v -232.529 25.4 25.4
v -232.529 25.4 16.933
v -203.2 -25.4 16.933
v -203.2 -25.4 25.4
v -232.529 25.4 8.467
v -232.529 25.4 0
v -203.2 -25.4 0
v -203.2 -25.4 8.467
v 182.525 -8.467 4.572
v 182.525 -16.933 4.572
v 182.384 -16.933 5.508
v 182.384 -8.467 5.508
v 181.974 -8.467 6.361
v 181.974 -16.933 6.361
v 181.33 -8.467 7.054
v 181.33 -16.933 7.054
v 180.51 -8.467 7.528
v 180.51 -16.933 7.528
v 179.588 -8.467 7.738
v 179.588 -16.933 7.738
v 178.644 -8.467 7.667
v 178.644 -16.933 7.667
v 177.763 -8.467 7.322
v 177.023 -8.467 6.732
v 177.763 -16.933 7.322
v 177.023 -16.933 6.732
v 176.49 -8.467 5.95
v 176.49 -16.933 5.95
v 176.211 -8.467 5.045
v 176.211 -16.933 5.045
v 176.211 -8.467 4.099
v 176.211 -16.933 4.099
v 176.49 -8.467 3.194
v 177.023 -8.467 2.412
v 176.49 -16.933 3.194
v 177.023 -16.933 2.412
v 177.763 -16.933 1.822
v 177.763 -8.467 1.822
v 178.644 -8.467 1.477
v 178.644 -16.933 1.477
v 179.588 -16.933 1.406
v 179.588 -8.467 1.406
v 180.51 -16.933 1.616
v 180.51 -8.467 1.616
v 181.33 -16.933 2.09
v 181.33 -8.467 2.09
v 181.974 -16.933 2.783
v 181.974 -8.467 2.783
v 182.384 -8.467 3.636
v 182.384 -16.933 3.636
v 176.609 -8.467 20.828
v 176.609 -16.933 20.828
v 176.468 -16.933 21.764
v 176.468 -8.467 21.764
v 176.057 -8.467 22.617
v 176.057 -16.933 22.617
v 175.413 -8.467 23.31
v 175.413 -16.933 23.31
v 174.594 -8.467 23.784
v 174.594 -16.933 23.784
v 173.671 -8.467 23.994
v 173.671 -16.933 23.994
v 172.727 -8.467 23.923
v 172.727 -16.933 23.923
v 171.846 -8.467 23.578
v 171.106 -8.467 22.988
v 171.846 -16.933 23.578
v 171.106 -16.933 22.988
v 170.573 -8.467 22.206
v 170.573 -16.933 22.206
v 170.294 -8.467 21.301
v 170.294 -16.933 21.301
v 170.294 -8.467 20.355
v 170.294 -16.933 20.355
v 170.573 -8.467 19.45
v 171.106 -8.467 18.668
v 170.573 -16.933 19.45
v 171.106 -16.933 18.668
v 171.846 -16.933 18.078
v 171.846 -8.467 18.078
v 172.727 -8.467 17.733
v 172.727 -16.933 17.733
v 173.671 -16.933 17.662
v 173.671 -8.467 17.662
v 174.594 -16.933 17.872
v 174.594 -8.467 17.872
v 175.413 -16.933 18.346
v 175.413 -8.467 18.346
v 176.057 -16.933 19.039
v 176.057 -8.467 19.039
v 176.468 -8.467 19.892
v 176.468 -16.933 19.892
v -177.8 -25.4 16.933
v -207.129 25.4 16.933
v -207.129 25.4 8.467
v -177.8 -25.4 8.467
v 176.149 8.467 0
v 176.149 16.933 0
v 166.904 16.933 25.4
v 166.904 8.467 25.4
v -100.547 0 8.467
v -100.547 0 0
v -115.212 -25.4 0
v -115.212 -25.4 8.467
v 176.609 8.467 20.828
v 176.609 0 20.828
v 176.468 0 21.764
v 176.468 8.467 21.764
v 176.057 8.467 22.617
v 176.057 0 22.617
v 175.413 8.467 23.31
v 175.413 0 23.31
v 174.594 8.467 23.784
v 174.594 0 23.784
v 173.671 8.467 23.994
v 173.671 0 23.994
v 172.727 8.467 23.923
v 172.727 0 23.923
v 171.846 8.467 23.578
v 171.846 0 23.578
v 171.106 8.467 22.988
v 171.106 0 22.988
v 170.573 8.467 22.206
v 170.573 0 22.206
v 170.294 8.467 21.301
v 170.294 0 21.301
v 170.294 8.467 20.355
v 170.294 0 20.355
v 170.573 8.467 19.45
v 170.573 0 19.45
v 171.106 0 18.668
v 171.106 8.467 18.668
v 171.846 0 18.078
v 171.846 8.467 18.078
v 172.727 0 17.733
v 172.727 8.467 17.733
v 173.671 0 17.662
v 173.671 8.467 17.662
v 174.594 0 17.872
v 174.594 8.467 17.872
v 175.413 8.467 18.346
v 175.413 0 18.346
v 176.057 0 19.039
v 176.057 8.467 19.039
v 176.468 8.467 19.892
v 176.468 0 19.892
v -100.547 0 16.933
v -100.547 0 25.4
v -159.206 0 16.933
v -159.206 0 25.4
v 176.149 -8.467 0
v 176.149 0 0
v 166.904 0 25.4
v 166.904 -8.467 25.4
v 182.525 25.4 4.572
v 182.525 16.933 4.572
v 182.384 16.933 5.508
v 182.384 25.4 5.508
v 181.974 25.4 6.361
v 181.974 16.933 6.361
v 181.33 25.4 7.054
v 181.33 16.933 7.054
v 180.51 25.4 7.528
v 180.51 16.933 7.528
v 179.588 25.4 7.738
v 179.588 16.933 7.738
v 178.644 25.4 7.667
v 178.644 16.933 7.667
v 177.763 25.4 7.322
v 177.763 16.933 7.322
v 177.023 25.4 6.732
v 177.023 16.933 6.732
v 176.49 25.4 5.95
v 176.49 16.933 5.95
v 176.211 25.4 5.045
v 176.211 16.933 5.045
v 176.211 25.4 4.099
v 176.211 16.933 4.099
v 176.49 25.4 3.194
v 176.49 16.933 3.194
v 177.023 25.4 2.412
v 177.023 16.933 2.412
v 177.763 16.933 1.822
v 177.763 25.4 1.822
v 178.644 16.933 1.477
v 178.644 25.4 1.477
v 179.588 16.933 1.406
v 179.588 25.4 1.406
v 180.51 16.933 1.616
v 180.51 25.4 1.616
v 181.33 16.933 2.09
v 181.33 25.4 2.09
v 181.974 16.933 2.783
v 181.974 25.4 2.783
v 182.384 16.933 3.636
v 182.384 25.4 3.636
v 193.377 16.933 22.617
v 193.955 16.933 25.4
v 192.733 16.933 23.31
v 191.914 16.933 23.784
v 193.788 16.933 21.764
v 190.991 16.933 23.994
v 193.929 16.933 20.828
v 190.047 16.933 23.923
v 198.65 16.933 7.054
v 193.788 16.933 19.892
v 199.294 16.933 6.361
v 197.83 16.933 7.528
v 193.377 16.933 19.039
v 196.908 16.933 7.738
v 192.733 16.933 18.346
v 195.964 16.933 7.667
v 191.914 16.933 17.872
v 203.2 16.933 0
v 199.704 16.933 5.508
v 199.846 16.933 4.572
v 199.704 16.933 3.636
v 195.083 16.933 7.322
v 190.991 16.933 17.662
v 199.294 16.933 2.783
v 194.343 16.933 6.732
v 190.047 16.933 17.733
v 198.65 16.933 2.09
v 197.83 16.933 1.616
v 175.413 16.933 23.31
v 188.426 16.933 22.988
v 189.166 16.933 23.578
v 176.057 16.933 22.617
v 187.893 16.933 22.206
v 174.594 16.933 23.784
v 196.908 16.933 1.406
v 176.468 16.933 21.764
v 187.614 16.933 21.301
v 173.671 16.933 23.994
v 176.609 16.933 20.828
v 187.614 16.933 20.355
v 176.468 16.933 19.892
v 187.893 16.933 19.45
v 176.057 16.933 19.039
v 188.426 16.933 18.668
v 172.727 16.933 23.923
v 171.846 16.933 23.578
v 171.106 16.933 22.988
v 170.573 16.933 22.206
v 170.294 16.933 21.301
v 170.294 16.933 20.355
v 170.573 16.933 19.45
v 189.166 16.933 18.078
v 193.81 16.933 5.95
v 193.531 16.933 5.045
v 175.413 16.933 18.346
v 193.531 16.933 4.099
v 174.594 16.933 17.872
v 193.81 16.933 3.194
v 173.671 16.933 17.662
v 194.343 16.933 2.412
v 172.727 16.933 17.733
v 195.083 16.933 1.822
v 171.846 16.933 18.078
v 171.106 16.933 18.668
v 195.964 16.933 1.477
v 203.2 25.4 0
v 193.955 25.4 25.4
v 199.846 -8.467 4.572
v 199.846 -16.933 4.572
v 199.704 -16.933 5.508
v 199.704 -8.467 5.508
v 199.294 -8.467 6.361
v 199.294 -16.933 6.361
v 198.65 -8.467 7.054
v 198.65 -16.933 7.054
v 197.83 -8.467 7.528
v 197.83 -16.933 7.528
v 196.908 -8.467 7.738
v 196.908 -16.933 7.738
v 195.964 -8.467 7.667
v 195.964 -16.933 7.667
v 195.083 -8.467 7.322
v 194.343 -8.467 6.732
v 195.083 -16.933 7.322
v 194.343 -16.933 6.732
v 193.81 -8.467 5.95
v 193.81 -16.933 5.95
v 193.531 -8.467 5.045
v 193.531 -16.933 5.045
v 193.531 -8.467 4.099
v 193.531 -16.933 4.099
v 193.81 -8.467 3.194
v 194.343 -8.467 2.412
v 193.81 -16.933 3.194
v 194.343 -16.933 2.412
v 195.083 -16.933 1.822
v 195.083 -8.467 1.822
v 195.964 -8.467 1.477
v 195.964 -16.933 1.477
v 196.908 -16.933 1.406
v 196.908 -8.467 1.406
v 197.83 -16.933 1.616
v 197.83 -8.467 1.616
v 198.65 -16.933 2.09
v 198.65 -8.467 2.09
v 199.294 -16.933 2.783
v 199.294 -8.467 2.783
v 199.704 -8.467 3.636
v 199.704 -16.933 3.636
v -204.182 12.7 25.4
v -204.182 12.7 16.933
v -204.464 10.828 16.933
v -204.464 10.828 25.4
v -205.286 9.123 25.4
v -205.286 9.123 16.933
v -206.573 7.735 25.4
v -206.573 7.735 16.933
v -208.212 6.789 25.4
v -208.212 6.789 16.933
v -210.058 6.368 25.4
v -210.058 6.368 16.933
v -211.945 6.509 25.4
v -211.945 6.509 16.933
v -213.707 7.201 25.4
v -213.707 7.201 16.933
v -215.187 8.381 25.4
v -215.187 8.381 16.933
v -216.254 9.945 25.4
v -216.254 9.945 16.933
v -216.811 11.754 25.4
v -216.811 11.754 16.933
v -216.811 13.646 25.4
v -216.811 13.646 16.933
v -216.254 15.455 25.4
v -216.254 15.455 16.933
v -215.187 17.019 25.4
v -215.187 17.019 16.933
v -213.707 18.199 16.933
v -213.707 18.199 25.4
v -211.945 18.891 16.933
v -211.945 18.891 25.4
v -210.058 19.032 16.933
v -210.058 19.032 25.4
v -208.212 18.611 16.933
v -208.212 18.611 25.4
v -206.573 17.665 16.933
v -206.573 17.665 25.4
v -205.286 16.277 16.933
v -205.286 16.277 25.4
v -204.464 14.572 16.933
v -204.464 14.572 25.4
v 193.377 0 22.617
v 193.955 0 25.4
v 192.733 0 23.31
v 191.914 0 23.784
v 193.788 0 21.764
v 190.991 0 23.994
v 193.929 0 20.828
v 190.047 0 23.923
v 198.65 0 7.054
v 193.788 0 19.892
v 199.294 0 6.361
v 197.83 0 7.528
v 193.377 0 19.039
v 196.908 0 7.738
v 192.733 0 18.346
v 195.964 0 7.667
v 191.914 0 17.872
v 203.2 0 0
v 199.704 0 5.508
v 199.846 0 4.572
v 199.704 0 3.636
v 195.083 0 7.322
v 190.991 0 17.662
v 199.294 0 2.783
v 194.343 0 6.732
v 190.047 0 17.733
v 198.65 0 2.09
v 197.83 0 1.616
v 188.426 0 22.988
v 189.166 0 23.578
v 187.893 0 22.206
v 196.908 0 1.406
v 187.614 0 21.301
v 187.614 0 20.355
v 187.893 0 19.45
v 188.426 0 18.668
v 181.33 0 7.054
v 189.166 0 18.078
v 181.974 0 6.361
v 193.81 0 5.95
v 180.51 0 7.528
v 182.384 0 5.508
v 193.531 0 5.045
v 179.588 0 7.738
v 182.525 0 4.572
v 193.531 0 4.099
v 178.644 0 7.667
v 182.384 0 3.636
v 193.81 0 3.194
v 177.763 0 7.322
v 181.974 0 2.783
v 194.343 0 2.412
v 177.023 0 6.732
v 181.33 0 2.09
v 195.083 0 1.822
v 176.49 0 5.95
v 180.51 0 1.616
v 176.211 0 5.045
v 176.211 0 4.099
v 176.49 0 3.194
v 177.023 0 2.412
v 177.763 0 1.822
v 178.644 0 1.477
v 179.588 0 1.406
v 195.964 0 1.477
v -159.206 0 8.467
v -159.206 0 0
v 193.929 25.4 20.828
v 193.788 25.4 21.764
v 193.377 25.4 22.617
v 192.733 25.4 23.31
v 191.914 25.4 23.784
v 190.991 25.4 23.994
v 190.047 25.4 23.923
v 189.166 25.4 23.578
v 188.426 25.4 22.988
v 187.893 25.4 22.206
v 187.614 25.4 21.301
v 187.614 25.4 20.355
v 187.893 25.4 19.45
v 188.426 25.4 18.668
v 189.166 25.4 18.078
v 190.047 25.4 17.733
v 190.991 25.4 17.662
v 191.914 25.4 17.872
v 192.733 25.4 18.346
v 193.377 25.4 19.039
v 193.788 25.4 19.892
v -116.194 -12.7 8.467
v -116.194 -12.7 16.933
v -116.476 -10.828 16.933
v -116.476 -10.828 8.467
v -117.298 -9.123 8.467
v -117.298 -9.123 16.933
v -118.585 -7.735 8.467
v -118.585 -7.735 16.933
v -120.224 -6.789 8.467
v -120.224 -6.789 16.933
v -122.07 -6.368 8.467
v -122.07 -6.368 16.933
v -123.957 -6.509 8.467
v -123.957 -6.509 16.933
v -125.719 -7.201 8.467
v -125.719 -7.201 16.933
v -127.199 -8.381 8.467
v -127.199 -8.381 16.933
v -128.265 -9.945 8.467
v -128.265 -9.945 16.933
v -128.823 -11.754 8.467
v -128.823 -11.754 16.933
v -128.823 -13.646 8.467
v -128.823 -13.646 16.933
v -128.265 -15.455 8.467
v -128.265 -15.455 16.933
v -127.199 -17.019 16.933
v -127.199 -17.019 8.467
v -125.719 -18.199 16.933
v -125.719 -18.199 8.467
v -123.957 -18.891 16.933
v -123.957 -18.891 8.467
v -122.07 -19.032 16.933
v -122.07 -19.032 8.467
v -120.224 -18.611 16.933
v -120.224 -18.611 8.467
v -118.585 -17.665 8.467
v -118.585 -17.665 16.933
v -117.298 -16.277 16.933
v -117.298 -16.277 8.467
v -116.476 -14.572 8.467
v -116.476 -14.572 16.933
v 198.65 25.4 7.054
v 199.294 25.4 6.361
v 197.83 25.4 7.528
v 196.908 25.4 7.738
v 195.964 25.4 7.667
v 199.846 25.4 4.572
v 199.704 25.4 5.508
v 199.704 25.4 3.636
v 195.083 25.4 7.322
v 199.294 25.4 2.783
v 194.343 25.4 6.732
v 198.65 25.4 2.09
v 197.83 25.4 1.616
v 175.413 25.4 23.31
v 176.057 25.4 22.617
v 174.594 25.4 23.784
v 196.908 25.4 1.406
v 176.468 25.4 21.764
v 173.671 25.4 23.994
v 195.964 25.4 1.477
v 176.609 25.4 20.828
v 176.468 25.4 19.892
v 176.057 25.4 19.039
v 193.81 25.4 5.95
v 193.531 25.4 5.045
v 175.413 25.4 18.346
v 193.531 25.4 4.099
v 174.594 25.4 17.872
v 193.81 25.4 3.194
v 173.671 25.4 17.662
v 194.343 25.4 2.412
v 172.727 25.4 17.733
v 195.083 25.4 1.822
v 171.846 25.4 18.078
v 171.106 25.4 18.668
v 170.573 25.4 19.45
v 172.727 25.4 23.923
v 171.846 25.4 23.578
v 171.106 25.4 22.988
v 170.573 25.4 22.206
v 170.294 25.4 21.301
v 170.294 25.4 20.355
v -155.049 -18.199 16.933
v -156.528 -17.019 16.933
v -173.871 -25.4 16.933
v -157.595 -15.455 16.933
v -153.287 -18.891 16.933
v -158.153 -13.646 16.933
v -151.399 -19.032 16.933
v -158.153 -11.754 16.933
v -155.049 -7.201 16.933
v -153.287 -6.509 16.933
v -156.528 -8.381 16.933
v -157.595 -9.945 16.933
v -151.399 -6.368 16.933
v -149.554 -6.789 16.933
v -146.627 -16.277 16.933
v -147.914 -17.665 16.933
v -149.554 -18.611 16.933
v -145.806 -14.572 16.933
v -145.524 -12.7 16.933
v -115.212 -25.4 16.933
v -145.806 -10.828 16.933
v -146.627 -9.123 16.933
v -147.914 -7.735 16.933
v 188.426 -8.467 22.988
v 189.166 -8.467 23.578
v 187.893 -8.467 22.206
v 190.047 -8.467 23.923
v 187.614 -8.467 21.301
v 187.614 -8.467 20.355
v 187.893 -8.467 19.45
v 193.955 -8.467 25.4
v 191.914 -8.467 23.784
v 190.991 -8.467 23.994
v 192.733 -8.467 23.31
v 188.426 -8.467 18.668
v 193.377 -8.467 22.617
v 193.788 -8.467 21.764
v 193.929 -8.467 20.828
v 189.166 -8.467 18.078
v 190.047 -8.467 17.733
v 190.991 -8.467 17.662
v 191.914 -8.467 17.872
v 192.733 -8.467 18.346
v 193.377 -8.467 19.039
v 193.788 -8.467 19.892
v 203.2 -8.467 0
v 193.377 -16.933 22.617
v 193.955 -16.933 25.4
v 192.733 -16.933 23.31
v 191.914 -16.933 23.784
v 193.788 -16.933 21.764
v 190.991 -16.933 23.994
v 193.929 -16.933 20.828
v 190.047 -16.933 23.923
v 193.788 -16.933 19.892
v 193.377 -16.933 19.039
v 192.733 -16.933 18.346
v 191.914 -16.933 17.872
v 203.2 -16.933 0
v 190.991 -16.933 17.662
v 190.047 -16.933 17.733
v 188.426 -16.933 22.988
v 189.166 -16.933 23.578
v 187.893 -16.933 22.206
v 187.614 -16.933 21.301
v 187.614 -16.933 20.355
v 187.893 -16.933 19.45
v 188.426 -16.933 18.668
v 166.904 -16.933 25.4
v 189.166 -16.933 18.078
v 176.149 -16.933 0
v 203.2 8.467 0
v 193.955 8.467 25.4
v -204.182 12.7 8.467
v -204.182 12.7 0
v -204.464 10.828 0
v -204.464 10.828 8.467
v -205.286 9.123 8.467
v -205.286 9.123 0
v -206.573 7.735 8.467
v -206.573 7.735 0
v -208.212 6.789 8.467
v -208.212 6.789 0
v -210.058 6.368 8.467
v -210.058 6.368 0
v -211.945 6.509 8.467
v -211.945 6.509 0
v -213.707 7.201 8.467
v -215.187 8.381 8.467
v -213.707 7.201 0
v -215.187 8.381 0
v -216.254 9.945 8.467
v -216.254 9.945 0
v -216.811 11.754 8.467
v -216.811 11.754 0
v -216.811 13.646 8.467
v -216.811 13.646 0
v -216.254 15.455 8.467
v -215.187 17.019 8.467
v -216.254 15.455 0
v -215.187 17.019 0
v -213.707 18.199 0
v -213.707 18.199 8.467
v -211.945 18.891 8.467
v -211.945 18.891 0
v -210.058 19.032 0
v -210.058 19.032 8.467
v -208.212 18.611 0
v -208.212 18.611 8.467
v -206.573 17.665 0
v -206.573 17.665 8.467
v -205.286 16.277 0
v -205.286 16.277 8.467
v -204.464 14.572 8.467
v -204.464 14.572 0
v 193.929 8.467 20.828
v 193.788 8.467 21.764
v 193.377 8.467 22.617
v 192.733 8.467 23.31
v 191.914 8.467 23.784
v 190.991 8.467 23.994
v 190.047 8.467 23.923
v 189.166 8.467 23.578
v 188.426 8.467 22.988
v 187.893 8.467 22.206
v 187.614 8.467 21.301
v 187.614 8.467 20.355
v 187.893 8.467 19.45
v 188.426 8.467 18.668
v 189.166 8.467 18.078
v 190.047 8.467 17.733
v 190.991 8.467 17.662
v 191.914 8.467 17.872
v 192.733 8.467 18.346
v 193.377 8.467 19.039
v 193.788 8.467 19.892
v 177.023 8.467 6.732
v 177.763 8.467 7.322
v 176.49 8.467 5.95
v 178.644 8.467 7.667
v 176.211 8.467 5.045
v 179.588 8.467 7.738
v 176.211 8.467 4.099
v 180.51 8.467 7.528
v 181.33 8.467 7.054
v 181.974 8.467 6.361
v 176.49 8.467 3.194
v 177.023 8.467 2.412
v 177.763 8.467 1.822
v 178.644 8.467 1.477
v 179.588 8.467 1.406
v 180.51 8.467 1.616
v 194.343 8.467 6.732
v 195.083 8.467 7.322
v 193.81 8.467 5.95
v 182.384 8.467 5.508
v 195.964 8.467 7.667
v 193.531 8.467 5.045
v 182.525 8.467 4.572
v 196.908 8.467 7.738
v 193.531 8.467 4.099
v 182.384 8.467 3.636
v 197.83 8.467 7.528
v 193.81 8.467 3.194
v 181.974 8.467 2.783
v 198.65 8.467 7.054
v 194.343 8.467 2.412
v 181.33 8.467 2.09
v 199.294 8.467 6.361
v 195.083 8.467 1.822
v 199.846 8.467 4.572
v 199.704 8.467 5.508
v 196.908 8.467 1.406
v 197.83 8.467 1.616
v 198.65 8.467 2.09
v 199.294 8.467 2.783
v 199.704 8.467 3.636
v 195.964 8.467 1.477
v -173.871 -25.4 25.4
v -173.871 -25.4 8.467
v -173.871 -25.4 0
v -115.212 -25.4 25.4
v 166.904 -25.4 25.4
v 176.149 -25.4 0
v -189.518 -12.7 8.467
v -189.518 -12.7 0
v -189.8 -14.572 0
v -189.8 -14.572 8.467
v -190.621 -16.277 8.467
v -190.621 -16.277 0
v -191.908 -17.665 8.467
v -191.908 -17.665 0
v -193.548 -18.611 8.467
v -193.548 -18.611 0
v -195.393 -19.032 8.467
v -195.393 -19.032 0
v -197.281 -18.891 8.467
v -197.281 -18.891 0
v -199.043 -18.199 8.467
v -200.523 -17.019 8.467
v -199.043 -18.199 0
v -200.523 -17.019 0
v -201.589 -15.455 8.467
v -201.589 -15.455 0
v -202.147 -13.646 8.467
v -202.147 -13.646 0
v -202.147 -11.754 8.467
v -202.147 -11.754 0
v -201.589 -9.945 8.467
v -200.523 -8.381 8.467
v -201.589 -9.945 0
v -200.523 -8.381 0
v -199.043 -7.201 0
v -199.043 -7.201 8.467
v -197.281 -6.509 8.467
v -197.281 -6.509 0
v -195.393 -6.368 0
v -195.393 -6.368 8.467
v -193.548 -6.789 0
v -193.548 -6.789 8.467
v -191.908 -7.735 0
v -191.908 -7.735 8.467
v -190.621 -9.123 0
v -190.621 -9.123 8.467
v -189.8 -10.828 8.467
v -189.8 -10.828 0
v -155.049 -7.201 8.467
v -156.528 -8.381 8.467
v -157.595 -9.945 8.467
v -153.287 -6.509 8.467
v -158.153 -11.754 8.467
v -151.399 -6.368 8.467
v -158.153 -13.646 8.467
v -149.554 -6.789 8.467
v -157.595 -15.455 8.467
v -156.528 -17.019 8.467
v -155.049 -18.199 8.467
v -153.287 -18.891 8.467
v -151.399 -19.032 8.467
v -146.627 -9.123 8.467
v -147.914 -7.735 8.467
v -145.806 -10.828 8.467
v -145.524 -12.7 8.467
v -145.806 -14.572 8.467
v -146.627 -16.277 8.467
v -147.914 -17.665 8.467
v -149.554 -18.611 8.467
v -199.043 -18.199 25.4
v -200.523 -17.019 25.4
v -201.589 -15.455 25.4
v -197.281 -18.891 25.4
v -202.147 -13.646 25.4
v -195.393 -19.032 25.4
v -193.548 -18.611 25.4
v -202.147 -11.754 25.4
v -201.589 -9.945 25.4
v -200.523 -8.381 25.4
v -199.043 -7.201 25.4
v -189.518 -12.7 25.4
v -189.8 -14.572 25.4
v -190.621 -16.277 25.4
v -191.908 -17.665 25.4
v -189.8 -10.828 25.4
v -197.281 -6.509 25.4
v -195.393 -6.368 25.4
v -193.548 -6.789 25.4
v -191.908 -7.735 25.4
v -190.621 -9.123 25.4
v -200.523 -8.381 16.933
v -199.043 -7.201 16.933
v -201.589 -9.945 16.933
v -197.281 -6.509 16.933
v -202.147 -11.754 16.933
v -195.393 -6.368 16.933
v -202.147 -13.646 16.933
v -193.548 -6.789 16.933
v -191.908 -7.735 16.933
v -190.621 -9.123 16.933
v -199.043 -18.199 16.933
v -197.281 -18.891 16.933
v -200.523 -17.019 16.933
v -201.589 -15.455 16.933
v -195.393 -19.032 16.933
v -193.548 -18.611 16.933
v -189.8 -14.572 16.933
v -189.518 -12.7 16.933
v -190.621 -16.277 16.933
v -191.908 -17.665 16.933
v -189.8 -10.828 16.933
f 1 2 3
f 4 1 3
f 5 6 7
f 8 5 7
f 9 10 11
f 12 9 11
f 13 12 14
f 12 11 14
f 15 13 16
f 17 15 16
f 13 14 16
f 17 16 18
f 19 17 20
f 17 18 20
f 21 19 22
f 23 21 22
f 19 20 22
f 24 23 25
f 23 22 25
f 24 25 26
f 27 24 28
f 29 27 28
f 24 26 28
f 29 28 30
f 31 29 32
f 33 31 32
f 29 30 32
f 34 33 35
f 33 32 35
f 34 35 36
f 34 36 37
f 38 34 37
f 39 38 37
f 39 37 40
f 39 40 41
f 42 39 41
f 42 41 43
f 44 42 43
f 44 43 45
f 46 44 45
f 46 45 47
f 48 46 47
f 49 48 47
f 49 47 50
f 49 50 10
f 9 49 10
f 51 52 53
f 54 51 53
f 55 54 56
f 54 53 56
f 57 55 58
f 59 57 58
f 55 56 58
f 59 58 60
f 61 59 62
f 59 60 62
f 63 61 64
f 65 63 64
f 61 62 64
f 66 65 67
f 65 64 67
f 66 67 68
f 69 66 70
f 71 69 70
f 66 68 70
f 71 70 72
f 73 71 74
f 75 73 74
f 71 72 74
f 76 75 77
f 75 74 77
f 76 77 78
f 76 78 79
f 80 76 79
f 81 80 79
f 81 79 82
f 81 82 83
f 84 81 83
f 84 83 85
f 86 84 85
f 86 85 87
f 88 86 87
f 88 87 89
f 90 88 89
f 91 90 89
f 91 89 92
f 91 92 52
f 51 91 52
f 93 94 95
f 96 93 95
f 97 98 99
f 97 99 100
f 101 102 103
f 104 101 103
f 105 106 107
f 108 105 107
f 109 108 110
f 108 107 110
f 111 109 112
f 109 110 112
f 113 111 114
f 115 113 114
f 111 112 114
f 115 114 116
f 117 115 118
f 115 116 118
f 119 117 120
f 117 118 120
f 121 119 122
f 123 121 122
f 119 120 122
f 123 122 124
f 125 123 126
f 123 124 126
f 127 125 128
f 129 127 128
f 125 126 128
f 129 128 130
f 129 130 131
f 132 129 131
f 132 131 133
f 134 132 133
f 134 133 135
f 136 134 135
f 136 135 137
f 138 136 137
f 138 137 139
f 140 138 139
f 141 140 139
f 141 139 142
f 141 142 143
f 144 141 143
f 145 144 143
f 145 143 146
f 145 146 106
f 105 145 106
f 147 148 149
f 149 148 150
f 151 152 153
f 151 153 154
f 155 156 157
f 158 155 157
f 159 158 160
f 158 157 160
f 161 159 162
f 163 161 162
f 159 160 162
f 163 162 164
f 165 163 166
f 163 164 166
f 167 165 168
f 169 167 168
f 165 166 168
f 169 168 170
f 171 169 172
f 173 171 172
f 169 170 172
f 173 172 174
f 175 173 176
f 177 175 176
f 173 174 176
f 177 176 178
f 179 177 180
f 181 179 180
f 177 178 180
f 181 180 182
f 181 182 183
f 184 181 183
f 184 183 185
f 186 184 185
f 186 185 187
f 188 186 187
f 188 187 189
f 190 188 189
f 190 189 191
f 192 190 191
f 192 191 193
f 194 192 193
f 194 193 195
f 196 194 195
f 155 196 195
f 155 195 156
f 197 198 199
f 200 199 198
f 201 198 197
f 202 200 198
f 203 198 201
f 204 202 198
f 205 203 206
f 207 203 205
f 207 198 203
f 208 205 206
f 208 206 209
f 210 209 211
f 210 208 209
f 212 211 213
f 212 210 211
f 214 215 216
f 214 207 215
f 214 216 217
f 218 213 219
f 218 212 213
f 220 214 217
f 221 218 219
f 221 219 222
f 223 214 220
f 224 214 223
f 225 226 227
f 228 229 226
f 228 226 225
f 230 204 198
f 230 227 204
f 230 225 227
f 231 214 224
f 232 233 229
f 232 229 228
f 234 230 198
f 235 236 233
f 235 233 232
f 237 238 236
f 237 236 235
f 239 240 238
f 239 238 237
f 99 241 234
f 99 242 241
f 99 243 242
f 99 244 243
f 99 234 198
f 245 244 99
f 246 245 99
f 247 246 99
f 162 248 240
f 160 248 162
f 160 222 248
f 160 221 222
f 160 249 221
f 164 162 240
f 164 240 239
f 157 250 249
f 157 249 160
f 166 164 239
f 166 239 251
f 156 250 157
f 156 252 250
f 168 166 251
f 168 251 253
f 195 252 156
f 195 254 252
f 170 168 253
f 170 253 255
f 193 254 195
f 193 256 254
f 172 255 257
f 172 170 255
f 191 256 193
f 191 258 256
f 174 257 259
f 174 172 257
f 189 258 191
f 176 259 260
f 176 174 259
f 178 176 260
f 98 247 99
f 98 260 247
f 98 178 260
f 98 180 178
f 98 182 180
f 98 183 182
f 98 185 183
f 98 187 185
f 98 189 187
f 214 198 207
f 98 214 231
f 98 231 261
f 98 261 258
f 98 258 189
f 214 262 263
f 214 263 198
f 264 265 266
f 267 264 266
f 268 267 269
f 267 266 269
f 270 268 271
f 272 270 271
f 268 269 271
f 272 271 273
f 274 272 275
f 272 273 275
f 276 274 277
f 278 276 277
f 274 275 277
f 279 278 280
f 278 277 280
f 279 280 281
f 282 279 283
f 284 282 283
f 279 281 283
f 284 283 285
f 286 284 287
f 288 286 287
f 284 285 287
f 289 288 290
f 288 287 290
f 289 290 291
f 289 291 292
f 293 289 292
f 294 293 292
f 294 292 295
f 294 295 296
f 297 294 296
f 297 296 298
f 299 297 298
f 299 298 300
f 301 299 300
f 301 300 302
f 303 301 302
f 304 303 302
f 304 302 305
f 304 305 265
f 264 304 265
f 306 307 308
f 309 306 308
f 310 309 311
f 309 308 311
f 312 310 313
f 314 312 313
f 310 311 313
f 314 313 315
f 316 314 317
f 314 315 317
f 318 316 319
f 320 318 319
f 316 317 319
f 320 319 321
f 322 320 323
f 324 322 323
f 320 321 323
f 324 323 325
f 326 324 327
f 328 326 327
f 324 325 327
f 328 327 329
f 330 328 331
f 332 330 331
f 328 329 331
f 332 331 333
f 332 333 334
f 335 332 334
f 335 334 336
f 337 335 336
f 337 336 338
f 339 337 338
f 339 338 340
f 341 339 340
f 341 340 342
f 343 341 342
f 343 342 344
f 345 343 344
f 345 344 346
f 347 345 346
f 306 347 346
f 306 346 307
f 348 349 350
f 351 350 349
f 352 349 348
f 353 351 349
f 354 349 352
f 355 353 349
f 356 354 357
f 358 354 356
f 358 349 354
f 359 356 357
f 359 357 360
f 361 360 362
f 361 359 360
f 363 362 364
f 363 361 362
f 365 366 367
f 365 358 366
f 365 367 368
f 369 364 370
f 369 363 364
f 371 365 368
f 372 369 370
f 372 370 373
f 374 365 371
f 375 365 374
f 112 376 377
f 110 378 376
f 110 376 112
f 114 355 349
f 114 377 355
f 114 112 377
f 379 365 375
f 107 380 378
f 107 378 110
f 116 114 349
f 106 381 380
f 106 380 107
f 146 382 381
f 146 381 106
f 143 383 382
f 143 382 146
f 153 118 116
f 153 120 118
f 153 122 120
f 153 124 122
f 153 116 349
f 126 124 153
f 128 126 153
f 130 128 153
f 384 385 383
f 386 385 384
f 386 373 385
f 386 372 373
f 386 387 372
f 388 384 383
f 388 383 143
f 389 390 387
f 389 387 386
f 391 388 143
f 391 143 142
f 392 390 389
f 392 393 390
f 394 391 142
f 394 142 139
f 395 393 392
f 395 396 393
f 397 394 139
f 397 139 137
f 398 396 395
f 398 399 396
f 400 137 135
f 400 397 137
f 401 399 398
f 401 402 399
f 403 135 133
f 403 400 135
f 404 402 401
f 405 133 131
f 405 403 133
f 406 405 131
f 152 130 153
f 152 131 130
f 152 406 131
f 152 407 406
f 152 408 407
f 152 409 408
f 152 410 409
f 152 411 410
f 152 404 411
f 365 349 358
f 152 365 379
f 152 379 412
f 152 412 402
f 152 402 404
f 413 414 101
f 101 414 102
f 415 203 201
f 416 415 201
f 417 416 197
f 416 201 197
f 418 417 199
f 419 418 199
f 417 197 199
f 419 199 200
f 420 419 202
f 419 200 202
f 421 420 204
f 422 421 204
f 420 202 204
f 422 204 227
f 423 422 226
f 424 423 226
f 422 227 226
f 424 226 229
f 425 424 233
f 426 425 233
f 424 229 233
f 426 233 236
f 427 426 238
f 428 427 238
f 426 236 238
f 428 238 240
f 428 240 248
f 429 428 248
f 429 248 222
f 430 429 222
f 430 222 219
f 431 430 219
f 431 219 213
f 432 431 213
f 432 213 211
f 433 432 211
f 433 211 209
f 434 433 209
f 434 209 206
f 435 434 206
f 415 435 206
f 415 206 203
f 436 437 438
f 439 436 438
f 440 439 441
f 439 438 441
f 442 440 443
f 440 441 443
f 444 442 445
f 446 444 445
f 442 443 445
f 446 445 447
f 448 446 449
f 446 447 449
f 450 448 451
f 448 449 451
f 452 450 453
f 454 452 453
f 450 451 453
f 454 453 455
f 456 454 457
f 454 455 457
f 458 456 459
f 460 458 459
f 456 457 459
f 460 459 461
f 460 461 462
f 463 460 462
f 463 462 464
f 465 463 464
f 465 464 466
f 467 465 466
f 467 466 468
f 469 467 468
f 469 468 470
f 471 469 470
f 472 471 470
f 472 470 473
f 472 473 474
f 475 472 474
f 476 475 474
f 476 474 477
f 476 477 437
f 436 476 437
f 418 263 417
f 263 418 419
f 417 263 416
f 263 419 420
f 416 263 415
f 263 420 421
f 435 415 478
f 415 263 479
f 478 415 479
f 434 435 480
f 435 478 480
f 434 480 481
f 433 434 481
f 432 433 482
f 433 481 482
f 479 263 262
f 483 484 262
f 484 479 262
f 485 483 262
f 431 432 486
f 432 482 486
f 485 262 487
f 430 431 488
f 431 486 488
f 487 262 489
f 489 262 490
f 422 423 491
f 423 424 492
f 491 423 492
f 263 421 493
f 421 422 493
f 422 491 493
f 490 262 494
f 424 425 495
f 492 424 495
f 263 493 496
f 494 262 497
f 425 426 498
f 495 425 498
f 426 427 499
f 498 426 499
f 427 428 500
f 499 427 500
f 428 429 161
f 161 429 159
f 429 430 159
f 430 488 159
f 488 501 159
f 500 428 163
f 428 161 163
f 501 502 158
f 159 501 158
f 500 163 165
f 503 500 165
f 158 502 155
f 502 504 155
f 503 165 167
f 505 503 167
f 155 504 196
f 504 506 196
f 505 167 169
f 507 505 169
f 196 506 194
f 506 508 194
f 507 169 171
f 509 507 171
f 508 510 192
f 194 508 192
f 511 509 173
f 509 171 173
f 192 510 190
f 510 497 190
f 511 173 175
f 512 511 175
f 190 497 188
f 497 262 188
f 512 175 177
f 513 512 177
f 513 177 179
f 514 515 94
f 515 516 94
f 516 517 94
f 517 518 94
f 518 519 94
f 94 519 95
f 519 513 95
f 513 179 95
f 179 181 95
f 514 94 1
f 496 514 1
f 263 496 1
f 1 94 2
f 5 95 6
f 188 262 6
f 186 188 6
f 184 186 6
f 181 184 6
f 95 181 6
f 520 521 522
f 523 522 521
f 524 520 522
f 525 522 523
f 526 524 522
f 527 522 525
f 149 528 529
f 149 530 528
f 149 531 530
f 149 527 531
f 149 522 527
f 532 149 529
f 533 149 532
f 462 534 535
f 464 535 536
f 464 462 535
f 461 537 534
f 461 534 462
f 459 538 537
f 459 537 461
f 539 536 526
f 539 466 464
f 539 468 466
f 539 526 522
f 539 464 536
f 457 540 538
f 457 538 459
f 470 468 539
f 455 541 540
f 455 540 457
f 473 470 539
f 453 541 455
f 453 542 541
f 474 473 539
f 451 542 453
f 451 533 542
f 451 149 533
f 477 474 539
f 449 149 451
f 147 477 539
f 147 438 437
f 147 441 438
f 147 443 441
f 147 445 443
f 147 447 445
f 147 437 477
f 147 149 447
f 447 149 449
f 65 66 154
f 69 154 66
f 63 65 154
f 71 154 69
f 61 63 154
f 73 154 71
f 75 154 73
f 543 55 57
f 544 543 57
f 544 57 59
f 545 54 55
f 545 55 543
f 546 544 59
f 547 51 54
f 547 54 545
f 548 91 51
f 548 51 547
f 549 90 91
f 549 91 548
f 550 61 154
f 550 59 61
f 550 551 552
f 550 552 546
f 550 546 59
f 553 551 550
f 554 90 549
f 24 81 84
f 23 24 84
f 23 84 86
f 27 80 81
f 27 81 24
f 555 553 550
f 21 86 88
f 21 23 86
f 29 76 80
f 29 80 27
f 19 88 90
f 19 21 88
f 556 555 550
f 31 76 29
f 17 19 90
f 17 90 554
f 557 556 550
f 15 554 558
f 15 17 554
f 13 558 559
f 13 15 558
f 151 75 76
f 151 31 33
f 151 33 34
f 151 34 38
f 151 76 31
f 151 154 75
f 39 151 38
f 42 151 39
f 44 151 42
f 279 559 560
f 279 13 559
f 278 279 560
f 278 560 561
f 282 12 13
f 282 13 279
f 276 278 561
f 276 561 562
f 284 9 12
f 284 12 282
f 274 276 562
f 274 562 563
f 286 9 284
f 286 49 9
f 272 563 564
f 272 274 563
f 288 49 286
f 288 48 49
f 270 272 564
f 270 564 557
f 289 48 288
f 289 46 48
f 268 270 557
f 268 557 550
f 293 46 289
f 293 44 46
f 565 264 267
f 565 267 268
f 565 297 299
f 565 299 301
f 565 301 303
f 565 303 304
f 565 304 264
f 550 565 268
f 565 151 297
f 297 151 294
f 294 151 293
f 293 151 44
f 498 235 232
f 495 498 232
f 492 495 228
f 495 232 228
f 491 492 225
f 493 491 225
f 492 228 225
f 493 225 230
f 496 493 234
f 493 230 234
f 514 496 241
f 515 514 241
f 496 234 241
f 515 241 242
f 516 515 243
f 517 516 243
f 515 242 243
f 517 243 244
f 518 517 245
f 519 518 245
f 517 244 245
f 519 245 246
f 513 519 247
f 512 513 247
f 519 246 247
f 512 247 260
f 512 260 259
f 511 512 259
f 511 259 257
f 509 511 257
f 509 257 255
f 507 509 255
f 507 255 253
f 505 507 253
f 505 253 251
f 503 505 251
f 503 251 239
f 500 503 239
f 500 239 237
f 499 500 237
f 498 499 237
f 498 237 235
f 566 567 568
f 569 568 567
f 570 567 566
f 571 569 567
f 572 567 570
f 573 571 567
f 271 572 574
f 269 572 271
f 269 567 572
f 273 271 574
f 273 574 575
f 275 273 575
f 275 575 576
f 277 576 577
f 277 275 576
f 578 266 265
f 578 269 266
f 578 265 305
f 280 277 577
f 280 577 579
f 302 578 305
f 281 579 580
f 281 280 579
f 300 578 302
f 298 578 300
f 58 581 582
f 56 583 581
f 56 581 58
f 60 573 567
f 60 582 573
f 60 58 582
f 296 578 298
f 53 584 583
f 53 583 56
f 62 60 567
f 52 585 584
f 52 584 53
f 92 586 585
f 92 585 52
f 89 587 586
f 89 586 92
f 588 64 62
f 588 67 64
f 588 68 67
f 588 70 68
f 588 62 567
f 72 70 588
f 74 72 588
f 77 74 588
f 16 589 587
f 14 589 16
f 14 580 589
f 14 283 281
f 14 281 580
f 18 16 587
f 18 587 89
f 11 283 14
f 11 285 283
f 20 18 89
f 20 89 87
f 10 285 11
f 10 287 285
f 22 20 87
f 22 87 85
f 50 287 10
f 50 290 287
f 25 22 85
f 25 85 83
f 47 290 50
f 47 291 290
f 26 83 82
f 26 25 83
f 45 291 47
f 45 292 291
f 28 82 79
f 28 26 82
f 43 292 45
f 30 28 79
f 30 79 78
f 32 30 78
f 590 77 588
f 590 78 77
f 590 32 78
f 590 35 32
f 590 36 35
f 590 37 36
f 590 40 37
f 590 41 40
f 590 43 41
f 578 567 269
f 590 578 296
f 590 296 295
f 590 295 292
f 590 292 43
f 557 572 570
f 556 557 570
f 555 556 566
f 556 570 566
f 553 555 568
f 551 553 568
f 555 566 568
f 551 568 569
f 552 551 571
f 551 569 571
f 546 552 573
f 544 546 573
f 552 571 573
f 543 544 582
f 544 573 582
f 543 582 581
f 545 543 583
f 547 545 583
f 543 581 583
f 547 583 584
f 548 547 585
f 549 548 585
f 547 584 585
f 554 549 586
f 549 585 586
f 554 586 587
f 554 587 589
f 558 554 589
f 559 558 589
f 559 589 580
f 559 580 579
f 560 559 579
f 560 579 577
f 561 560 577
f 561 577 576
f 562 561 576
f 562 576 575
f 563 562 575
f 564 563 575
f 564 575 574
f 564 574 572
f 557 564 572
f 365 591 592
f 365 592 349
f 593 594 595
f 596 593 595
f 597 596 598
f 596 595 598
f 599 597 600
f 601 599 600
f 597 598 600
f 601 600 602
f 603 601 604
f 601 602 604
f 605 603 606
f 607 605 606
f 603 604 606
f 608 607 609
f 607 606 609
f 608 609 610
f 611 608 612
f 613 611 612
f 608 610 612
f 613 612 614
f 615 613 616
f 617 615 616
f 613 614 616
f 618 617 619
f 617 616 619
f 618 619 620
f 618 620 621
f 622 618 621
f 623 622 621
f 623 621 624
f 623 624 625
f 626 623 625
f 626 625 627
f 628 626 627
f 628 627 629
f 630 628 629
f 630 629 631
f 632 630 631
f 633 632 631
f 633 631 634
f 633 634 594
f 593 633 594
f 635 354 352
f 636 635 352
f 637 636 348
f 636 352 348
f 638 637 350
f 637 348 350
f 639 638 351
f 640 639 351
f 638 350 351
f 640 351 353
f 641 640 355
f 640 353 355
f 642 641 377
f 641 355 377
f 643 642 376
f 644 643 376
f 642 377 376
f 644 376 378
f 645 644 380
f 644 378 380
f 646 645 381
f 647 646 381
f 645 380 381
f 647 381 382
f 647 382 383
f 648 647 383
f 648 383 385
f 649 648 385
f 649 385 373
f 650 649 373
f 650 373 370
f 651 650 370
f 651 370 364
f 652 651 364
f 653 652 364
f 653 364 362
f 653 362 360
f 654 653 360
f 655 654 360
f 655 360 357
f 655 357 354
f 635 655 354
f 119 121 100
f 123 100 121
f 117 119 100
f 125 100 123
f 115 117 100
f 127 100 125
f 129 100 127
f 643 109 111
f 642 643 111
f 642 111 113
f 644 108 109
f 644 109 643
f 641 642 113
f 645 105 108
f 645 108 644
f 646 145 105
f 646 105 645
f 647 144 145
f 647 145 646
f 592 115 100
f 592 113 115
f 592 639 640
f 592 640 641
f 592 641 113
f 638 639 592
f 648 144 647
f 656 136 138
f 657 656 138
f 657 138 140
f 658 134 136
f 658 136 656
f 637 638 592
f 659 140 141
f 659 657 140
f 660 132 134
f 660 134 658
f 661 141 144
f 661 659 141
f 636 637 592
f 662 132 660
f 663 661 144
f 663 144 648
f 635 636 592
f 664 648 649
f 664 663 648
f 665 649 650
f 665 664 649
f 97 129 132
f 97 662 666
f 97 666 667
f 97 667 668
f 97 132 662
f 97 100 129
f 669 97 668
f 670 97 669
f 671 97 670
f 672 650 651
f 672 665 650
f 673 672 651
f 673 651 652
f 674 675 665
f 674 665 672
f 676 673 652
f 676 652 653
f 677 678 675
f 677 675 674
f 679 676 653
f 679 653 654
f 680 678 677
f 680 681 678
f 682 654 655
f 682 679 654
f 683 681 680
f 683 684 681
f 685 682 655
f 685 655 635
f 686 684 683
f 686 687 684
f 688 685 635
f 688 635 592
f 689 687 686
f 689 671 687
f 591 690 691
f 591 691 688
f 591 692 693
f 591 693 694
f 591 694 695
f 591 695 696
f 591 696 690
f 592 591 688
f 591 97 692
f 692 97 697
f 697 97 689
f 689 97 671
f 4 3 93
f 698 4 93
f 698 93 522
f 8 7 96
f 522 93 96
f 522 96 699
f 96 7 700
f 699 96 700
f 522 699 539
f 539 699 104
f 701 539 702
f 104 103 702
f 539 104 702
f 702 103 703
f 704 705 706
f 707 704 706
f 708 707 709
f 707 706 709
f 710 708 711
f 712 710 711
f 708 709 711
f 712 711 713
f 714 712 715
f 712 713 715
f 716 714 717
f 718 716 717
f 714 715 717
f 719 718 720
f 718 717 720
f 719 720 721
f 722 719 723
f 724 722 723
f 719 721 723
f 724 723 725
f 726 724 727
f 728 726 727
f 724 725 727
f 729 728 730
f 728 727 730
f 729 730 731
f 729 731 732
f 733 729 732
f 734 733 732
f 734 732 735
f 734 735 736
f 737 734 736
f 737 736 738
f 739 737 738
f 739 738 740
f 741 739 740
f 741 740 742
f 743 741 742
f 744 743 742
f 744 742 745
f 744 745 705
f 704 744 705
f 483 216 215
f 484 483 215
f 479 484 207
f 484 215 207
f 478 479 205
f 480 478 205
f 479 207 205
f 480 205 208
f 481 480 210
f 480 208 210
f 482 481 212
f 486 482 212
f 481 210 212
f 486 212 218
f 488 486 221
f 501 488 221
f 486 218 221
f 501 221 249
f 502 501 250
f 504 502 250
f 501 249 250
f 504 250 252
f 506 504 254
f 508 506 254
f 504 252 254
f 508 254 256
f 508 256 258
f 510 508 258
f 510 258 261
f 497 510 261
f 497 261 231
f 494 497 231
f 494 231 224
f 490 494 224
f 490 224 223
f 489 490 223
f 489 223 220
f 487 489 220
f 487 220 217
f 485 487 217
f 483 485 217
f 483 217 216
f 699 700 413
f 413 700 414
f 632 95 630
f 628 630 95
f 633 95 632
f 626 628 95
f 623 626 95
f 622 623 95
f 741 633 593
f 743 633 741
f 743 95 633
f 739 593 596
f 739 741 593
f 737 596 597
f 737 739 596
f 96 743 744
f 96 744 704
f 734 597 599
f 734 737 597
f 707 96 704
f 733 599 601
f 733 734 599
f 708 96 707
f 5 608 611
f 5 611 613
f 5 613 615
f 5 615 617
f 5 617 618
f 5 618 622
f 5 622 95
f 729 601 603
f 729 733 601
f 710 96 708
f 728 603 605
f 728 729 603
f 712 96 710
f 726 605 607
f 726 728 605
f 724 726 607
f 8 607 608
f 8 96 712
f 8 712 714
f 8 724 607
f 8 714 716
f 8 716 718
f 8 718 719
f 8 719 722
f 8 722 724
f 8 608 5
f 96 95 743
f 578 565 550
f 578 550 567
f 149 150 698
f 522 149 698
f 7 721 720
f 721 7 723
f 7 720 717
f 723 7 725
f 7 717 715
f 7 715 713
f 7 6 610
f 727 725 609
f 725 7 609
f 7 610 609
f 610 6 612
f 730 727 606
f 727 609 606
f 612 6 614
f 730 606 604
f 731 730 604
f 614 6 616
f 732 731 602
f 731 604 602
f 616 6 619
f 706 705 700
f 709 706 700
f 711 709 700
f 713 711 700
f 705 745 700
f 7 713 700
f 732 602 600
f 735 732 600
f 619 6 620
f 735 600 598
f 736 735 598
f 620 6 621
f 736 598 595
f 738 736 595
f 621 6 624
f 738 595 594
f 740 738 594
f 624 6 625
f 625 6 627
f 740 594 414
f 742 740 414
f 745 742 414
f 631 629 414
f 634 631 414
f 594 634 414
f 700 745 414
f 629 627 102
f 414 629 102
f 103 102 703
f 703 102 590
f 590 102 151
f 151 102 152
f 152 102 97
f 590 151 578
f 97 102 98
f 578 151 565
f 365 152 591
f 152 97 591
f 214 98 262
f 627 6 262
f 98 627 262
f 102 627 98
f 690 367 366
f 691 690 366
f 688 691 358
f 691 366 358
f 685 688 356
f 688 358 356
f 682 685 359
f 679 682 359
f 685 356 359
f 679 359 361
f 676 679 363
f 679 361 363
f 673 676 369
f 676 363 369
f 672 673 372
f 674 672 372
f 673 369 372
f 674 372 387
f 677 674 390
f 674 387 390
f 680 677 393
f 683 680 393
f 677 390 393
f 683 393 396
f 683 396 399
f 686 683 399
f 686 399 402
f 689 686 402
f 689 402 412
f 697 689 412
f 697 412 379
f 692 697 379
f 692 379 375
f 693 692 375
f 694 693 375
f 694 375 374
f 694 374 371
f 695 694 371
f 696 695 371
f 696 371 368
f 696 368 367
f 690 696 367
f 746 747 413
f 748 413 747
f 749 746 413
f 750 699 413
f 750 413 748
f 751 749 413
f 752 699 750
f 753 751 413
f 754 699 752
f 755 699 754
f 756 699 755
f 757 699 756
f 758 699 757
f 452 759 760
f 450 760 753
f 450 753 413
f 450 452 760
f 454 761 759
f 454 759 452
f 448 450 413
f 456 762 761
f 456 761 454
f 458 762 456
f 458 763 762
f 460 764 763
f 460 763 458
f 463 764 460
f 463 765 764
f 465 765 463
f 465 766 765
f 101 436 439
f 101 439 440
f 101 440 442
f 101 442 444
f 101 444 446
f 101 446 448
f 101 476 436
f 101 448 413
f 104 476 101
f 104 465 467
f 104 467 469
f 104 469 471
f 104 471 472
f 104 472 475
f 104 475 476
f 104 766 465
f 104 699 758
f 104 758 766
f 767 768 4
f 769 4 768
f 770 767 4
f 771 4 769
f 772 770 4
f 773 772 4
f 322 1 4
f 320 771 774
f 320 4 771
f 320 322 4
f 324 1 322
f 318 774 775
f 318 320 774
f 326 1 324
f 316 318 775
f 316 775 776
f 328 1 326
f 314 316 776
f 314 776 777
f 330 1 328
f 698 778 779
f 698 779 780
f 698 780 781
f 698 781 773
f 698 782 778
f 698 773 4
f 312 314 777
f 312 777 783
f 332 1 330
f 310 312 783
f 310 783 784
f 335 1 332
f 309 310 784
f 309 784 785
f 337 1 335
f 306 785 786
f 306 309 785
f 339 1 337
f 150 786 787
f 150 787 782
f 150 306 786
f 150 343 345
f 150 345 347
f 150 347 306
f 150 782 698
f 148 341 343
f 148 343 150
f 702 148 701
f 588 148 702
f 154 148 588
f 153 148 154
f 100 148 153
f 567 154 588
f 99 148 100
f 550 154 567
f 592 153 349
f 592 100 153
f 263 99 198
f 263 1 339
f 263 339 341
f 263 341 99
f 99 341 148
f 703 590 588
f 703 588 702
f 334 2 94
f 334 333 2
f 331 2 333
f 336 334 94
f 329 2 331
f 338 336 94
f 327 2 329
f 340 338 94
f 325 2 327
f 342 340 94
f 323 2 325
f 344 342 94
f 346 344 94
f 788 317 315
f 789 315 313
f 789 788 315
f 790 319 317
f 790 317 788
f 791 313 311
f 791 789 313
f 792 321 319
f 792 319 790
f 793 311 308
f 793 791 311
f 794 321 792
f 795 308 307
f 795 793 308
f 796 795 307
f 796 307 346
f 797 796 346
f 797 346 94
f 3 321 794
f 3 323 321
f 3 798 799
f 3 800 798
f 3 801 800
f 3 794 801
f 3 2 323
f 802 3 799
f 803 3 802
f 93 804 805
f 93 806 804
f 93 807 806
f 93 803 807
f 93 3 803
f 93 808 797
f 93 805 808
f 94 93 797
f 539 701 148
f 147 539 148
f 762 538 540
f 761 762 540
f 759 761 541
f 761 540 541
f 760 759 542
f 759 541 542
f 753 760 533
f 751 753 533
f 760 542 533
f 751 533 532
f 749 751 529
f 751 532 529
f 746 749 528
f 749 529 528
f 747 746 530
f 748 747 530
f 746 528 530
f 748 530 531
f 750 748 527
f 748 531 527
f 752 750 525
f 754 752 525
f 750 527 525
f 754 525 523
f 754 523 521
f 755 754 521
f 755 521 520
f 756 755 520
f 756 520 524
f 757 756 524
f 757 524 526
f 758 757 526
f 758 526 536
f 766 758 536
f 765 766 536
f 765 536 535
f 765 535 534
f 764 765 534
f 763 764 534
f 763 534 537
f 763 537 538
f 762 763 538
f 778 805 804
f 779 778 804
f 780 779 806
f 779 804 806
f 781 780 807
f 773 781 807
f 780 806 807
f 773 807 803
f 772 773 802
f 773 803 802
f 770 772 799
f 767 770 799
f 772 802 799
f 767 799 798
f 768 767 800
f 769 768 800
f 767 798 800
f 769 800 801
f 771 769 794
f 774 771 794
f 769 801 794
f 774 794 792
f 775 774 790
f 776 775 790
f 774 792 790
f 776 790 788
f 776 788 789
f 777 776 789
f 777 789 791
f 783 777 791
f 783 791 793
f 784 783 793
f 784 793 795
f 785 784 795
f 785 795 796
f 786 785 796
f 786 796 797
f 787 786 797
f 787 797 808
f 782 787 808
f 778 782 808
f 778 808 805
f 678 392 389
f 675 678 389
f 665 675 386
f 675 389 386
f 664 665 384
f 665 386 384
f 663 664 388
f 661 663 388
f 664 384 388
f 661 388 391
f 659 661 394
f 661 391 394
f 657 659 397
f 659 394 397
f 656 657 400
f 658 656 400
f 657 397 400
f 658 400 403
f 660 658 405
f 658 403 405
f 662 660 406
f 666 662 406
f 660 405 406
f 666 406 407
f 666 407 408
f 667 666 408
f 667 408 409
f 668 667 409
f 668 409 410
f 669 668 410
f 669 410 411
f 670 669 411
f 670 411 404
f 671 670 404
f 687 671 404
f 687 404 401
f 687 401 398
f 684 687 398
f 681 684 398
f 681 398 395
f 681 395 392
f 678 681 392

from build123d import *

# Parameters (mm, degrees)
F1_DEPTH  = 25.4
F3_DEPTH  = 8.4666666667
F5_DEPTH  = 8.4666666667
F6_W      = 25.4
F6_H      = 8.4666666667
F9_W      = 27.051
F9_H      = 8.4666666667
F13_R     = 6.35
F14_DEPTH = 16.9343333333
F12_R     = 3.175
F15_DEPTH = 42.3343333333
F16_R     = 6.35
F17_DEPTH = 25.401


with BuildPart() as f1:
    # F0 (on Top) → F1 (new body)
    with BuildSketch(Plane.XY):
        Polygon((-232.5293936748, 25.4), (-203.2, -25.4), (203.2, -25.4), (203.2, 25.4), align=None)
    extrude(amount=F1_DEPTH)

    # F2 (on face) → F3 (cut)
    with BuildSketch(Plane.XY.offset(25.4)):
        Polygon((-159.2059094878, 0), (-173.8706063252, -25.4), (-115.2118189755, -25.4), (-100.5471221381, 0), align=None)
    extrude(amount=-F3_DEPTH, mode=Mode.SUBTRACT)

    # F4 (on face) → F5 (cut)
    with BuildSketch(Plane(origin=(0, 0, 0), x_dir=(1, 0, 0), z_dir=(0, 0, -1))):
        Polygon((-100.5471221381, 0), (-115.2118189755, 25.4), (-173.8706063252, 25.4), (-159.2059094878, 0), align=None)
    extrude(amount=-F5_DEPTH, mode=Mode.SUBTRACT)

    # F7: sweep along a path in F7_path
    with BuildLine(Plane(origin=(-232.5293936748, 25.4, 25.4), x_dir=(-0.5, 0.8660254038, 0), z_dir=(-0.8660254038, -0.5, 0))) as f7_path:
        Line((0, 0), (-58.6587873497, 0))
    # F6 (on face) → F7 (sweep, cut)
    with BuildSketch(Plane(origin=(0, 25.4, 0), x_dir=(-1, 0, 0), z_dir=(0, 1, 0))):
        with Locations((219.8293936748, 12.7)):
            Rectangle(F6_W, F6_H)
    sweep(path=f7_path.line, mode=Mode.SUBTRACT)

    # F10: sweep along a path in F8
    with BuildLine(Plane.XZ.offset(25.4)) as f10_path:
        Line((193.9551560496, 25.4), (203.2, 0))
    # F9 (on face) → F10 (sweep, cut)
    with BuildSketch(Plane.XY.offset(25.4)):
        with Locations((180.4296560496, -21.1666666667)):
            Rectangle(F9_W, F9_H)
        with Locations((180.4296560496, -4.2333333333)):
            Rectangle(F9_W, F9_H)
        with Locations((180.4296560496, 12.7)):
            Rectangle(F9_W, F9_H)
        Polygon((203.2, 25.4), (193.9551560496, 25.4), (193.9551560496, 16.9333333333), (193.9551560496, 8.4666666667), (193.9551560496, 0), (193.9551560496, -8.4666666667), (193.9551560496, -16.9333333333), (193.9551560496, -25.4), (203.2, -25.4), align=None)
    sweep(path=f10_path.line, mode=Mode.SUBTRACT)

    # F13 (on face) → F14 (cut, through all)
    with BuildSketch(Plane.XY.offset(16.9333333333)):
        with Locations((-151.873561069, -12.7)):
            Circle(F13_R)
        with Locations((-122.5441673942, -12.7)):
            Circle(F13_R)
    extrude(amount=-F14_DEPTH, mode=Mode.SUBTRACT)

    # F12 (on face) → F15 (cut, through all)
    with BuildSketch(Plane.XZ.offset(16.9333333333)):
        with Locations((190.7538071849, 20.828)):
            Circle(F12_R)
        with Locations((196.6705073132, 4.572)):
            Circle(F12_R)
        with Locations((173.4336487365, 20.828)):
            Circle(F12_R)
        with Locations((179.3503488647, 4.572)):
            Circle(F12_R)
    extrude(amount=-F15_DEPTH, mode=Mode.SUBTRACT)

    # F16 (on face) → F17 (cut, through all)
    with BuildSketch(Plane(origin=(0, 0, 0), x_dir=(1, 0, 0), z_dir=(0, 0, -1))):
        with Locations((-195.8676515813, 12.7)):
            Circle(F16_R)
        with Locations((-210.5323484187, -12.7)):
            Circle(F16_R)
    extrude(amount=-F17_DEPTH, mode=Mode.SUBTRACT)


solid = f1.part
